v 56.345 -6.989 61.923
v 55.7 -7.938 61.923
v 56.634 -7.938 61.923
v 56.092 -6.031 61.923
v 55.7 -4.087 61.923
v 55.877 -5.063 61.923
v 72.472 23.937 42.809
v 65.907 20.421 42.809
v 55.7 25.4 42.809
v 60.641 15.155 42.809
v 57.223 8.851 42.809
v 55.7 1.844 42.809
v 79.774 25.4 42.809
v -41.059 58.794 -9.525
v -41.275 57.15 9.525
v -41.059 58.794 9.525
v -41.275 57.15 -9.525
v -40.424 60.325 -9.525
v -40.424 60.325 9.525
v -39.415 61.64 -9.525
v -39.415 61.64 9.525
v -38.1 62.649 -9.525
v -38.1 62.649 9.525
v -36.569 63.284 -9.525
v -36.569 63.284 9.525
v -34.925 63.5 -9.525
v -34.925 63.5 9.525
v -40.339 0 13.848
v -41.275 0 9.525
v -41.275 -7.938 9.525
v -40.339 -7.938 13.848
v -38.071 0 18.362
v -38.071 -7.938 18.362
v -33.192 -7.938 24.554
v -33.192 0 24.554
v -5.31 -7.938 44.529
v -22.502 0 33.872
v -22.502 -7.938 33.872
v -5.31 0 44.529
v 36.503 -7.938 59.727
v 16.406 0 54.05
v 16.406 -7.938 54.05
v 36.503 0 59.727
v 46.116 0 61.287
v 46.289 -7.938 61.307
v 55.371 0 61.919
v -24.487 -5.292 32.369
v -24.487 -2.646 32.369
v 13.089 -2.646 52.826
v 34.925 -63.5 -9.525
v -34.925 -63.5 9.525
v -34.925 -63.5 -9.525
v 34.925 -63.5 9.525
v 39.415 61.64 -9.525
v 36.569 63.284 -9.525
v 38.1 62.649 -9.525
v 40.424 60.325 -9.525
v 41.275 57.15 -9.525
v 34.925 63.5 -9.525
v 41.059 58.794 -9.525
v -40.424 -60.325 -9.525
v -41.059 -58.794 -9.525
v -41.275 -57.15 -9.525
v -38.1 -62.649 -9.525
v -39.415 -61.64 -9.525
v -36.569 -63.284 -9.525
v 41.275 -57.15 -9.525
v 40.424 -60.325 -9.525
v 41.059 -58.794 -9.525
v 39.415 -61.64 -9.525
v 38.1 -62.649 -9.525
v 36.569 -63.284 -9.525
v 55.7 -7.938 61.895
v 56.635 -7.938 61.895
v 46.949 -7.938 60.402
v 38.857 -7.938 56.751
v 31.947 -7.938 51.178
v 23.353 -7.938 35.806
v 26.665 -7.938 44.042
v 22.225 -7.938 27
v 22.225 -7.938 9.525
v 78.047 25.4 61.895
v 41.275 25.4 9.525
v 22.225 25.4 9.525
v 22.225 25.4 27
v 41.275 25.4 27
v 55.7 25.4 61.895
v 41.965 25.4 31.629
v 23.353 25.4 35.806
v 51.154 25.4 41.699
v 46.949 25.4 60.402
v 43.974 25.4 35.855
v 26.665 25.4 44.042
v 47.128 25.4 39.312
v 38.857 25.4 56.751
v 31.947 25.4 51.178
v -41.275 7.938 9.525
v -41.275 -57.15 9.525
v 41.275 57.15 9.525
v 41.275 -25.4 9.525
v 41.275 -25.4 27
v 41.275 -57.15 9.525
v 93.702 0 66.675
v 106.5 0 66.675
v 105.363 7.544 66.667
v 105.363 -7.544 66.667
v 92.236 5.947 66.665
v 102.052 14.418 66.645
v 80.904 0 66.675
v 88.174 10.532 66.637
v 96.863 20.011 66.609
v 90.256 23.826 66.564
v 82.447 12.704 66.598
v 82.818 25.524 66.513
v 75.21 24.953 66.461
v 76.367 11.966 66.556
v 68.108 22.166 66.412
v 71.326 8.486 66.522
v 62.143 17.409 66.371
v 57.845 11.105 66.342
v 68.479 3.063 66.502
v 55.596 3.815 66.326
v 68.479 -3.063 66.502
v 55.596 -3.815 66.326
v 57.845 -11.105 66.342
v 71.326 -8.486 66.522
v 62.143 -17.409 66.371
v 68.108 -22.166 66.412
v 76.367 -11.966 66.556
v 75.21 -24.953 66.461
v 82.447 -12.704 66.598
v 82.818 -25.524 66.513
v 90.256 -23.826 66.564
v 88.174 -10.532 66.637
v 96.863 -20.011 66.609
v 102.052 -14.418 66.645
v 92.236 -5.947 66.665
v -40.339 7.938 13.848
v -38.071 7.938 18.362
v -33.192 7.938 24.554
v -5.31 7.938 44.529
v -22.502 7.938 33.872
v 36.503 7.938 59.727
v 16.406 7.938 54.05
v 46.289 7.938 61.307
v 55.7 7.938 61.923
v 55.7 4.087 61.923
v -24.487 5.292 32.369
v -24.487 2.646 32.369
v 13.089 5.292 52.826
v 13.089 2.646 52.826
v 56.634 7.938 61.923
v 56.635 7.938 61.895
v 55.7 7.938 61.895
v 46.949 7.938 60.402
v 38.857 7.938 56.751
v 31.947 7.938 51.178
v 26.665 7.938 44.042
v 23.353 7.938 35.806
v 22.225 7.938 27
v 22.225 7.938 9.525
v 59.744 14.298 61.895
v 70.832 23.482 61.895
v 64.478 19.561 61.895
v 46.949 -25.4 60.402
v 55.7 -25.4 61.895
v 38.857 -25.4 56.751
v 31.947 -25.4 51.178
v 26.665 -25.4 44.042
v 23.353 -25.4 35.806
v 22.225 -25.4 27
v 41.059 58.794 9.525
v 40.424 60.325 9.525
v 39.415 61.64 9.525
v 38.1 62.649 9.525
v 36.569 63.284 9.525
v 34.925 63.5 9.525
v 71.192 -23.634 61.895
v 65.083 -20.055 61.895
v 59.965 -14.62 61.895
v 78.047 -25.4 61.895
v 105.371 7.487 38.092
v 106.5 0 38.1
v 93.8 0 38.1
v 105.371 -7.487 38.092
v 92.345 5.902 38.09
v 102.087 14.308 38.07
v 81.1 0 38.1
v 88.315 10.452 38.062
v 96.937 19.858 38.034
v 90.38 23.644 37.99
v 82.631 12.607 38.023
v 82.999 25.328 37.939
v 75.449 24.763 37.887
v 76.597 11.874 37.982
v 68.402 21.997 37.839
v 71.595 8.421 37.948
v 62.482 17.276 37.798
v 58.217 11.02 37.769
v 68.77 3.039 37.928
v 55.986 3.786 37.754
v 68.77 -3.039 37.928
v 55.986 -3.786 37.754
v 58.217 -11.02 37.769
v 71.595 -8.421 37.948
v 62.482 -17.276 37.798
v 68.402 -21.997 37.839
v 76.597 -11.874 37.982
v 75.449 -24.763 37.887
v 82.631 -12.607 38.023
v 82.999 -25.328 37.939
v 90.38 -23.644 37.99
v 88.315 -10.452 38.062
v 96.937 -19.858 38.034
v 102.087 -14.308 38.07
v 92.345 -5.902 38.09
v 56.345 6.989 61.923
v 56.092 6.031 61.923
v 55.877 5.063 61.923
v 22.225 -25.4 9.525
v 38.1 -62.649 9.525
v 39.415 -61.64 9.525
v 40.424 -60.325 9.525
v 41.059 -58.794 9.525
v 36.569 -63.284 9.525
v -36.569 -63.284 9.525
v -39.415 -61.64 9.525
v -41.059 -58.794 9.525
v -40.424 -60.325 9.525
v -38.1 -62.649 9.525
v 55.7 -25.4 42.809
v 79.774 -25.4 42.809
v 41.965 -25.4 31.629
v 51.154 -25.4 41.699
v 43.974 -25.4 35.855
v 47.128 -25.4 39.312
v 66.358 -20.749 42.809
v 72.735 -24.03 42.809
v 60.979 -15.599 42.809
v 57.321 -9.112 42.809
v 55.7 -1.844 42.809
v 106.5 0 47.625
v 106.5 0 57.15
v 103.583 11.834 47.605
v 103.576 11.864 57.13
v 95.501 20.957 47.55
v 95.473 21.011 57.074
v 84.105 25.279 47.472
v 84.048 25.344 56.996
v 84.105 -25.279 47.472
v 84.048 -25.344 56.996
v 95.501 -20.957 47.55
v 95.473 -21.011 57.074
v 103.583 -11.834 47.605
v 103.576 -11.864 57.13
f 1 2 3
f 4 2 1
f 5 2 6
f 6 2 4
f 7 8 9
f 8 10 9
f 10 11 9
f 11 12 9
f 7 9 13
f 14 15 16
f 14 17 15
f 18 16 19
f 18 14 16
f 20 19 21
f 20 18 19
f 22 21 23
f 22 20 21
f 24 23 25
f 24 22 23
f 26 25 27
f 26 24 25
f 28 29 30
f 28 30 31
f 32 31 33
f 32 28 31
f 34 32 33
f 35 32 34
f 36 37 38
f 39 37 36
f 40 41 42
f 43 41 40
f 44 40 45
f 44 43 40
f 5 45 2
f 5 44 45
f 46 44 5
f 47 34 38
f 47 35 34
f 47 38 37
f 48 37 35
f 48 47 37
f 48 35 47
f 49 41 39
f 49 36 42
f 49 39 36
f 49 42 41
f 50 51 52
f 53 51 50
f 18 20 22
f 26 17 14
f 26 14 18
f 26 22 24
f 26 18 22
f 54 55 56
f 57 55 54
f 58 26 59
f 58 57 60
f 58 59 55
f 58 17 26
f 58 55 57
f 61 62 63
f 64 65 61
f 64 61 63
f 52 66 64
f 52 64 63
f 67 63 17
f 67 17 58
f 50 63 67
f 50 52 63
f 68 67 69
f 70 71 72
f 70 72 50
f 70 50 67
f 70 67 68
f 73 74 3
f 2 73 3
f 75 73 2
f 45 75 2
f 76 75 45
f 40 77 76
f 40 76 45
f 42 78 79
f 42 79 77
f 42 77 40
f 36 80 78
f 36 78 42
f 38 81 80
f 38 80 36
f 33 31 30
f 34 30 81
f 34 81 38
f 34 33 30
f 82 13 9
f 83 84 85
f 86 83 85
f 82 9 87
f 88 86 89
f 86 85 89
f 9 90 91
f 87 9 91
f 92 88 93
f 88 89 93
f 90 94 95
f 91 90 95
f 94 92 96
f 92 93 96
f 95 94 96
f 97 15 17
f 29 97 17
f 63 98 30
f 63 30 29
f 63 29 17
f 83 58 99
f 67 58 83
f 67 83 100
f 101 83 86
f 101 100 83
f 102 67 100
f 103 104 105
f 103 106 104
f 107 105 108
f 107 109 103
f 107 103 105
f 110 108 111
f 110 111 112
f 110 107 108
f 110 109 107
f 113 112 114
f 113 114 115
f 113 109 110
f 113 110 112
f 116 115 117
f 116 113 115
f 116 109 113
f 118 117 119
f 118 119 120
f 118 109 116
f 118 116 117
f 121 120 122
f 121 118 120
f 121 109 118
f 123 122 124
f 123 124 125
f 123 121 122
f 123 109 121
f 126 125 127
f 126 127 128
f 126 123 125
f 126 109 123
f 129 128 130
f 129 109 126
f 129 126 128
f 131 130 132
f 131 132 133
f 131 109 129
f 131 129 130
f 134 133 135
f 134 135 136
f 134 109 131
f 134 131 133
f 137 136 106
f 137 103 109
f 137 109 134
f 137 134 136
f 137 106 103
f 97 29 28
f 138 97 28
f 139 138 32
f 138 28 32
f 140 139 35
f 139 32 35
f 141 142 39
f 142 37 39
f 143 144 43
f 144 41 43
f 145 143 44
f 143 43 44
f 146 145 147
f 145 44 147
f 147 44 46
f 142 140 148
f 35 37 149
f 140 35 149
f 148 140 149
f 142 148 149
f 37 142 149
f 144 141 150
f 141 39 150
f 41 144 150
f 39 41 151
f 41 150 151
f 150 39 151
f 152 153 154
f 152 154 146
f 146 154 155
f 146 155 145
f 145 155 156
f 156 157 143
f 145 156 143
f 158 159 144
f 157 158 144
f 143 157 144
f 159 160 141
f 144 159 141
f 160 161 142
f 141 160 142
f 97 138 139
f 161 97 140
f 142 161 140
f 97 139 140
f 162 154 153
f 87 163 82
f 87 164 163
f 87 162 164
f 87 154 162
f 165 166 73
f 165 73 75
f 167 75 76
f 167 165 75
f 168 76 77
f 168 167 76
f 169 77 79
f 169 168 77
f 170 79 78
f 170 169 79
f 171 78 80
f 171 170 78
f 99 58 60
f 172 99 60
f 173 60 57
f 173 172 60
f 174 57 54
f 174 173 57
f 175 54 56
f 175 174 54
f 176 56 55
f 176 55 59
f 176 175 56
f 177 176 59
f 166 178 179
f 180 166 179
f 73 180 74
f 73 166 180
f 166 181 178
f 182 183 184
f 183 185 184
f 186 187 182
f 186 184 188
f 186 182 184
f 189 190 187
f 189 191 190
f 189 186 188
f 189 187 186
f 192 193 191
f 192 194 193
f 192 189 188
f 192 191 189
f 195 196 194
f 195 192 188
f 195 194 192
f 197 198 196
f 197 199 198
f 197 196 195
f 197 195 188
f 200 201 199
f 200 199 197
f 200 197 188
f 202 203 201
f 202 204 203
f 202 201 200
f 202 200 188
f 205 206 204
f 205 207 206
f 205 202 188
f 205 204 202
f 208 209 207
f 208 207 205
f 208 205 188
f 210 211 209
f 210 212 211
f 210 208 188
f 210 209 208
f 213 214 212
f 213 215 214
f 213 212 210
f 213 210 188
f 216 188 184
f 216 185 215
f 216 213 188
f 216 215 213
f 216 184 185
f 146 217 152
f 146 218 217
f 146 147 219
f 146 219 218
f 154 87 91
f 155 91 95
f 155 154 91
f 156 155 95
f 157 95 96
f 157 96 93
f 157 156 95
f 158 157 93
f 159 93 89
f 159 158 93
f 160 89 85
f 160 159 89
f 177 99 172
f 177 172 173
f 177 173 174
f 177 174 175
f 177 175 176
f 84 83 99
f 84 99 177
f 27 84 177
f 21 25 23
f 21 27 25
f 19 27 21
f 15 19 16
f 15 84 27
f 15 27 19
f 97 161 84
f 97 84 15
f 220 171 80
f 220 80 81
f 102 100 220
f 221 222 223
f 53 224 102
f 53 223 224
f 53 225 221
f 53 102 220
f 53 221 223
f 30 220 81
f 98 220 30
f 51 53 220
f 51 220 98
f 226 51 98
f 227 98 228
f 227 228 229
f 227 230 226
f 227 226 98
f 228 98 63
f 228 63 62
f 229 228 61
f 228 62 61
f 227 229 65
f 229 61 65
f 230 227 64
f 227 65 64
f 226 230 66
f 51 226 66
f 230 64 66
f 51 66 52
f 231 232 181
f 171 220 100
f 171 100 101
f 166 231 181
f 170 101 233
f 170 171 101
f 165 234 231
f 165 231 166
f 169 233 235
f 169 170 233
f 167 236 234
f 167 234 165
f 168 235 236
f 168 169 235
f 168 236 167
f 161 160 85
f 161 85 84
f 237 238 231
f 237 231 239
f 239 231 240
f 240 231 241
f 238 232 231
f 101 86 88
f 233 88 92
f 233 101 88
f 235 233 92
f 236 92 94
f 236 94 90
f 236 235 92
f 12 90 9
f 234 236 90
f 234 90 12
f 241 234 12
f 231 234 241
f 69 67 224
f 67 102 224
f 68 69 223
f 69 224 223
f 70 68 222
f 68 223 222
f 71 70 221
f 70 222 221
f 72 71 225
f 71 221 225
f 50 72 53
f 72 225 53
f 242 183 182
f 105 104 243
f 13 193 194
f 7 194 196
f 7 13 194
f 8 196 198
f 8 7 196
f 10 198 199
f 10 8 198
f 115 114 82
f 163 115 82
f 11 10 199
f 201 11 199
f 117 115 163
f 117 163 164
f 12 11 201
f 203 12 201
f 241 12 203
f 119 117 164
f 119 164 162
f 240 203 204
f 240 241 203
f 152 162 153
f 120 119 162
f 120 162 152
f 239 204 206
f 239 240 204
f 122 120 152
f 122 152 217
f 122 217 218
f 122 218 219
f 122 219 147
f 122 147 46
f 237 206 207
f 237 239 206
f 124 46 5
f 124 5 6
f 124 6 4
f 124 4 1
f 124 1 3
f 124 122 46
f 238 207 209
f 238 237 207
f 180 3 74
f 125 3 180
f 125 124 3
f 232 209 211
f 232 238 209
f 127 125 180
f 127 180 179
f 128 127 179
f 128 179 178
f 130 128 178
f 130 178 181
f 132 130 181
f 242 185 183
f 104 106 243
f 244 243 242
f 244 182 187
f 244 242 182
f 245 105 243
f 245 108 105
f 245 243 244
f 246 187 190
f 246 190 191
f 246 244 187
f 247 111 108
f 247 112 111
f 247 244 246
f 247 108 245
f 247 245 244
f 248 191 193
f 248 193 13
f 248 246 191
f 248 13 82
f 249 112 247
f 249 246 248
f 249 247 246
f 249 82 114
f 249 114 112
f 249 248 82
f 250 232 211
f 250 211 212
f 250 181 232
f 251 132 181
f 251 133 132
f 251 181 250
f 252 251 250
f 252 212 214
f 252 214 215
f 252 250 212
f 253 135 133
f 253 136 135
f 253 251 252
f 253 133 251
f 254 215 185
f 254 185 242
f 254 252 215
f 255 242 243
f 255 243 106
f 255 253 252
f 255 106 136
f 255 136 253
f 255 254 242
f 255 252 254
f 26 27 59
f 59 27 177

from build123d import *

# Parameters (mm, degrees)
F1_DEPTH = 63.5
F2_DEPTH = 25.4
F3_DEPTH = 7.9375
F4_DEPTH = 25.4
F6_R     = 6.35


with BuildPart() as f1:
    # F0 (on Front) → F1 (new body, symmetric)
    with BuildSketch(Plane.XZ):
        Polygon((22.225, 9.525), (-41.275, 9.525), (-41.275, -9.525), (41.275, -9.525), (41.275, 9.525), align=None)
    extrude(amount=F1_DEPTH, both=True)

    # F0 (on Front) → F2 (join, symmetric)
    with BuildSketch(Plane.XZ):
        with BuildLine():
            Line((22.225, 27.0002), (22.225, 9.525))
            Line((22.225, 9.525), (41.275, 9.525))
            Line((41.275, 9.525), (41.275, 27.0002))
            ThreePointArc((41.275, 27.0002), (45.4231719771, 37.70053315), (55.6998352153, 42.8088257182))
            Line((55.6998352153, 42.8088257182), (55.6998352153, 61.8950799553))
            ThreePointArc((55.6998352153, 61.8950799553), (31.9467995078, 51.1777579815), (22.225, 27.0002))
        make_face()
    extrude(amount=F2_DEPTH, both=True)

    # F0 (on Front) → F3 (join, symmetric)
    with BuildSketch(Plane.XZ):
        with BuildLine():
            add(Edge.make_bspline(
                [(-41.275, 9.525), (-40.1314669034, 30.5728232182), (15.8217890978, 61.4964285617), (55.6998352153, 61.9232521068)],
                knots=[0, 0, 0, 0, 110.1624749452, 110.1624749452, 110.1624749452, 110.1624749452], degree=3))
            Line((-41.275, 9.525), (22.225, 9.525))
            Line((22.225, 9.525), (22.225, 27.0002))
            ThreePointArc((22.225, 27.0002), (31.9467995078, 51.1777579815), (55.6998352153, 61.8950799553))
            Line((55.6998352153, 61.8950799553), (55.6998352153, 61.9232521068))
        make_face()
    extrude(amount=F3_DEPTH, both=True)

    # F4 (add): a face of the model
    f4_faces = [f1.faces().sort_by_distance(p)[0] for p in [
        (55.6998352153, 0, 52.3563592003),
    ]]
    extrude(f4_faces, amount=F4_DEPTH)

    # F0 (on Front) → F5 (revolve)
    with BuildSketch(Plane.XZ):
        Polygon((106.4998352153, 66.675), (80.9040206471, 66.675), (81.0998352153, 38.1), (106.4998352153, 38.1), align=None)
    revolve(axis=Axis((81.0019279312, 0, 52.3875), (-0.0068524924, 0, 0.9999765214)))

    # F6
    f6_edges = [f1.edges().sort_by_distance(p)[0] for p in [
        (-41.275, 63.5, 0),
        (-41.275, -63.5, 0),
        (41.275, -63.5, 0),
        (41.275, 63.5, 0),
    ]]
    fillet(f6_edges, radius=F6_R)


solid = f1.part
